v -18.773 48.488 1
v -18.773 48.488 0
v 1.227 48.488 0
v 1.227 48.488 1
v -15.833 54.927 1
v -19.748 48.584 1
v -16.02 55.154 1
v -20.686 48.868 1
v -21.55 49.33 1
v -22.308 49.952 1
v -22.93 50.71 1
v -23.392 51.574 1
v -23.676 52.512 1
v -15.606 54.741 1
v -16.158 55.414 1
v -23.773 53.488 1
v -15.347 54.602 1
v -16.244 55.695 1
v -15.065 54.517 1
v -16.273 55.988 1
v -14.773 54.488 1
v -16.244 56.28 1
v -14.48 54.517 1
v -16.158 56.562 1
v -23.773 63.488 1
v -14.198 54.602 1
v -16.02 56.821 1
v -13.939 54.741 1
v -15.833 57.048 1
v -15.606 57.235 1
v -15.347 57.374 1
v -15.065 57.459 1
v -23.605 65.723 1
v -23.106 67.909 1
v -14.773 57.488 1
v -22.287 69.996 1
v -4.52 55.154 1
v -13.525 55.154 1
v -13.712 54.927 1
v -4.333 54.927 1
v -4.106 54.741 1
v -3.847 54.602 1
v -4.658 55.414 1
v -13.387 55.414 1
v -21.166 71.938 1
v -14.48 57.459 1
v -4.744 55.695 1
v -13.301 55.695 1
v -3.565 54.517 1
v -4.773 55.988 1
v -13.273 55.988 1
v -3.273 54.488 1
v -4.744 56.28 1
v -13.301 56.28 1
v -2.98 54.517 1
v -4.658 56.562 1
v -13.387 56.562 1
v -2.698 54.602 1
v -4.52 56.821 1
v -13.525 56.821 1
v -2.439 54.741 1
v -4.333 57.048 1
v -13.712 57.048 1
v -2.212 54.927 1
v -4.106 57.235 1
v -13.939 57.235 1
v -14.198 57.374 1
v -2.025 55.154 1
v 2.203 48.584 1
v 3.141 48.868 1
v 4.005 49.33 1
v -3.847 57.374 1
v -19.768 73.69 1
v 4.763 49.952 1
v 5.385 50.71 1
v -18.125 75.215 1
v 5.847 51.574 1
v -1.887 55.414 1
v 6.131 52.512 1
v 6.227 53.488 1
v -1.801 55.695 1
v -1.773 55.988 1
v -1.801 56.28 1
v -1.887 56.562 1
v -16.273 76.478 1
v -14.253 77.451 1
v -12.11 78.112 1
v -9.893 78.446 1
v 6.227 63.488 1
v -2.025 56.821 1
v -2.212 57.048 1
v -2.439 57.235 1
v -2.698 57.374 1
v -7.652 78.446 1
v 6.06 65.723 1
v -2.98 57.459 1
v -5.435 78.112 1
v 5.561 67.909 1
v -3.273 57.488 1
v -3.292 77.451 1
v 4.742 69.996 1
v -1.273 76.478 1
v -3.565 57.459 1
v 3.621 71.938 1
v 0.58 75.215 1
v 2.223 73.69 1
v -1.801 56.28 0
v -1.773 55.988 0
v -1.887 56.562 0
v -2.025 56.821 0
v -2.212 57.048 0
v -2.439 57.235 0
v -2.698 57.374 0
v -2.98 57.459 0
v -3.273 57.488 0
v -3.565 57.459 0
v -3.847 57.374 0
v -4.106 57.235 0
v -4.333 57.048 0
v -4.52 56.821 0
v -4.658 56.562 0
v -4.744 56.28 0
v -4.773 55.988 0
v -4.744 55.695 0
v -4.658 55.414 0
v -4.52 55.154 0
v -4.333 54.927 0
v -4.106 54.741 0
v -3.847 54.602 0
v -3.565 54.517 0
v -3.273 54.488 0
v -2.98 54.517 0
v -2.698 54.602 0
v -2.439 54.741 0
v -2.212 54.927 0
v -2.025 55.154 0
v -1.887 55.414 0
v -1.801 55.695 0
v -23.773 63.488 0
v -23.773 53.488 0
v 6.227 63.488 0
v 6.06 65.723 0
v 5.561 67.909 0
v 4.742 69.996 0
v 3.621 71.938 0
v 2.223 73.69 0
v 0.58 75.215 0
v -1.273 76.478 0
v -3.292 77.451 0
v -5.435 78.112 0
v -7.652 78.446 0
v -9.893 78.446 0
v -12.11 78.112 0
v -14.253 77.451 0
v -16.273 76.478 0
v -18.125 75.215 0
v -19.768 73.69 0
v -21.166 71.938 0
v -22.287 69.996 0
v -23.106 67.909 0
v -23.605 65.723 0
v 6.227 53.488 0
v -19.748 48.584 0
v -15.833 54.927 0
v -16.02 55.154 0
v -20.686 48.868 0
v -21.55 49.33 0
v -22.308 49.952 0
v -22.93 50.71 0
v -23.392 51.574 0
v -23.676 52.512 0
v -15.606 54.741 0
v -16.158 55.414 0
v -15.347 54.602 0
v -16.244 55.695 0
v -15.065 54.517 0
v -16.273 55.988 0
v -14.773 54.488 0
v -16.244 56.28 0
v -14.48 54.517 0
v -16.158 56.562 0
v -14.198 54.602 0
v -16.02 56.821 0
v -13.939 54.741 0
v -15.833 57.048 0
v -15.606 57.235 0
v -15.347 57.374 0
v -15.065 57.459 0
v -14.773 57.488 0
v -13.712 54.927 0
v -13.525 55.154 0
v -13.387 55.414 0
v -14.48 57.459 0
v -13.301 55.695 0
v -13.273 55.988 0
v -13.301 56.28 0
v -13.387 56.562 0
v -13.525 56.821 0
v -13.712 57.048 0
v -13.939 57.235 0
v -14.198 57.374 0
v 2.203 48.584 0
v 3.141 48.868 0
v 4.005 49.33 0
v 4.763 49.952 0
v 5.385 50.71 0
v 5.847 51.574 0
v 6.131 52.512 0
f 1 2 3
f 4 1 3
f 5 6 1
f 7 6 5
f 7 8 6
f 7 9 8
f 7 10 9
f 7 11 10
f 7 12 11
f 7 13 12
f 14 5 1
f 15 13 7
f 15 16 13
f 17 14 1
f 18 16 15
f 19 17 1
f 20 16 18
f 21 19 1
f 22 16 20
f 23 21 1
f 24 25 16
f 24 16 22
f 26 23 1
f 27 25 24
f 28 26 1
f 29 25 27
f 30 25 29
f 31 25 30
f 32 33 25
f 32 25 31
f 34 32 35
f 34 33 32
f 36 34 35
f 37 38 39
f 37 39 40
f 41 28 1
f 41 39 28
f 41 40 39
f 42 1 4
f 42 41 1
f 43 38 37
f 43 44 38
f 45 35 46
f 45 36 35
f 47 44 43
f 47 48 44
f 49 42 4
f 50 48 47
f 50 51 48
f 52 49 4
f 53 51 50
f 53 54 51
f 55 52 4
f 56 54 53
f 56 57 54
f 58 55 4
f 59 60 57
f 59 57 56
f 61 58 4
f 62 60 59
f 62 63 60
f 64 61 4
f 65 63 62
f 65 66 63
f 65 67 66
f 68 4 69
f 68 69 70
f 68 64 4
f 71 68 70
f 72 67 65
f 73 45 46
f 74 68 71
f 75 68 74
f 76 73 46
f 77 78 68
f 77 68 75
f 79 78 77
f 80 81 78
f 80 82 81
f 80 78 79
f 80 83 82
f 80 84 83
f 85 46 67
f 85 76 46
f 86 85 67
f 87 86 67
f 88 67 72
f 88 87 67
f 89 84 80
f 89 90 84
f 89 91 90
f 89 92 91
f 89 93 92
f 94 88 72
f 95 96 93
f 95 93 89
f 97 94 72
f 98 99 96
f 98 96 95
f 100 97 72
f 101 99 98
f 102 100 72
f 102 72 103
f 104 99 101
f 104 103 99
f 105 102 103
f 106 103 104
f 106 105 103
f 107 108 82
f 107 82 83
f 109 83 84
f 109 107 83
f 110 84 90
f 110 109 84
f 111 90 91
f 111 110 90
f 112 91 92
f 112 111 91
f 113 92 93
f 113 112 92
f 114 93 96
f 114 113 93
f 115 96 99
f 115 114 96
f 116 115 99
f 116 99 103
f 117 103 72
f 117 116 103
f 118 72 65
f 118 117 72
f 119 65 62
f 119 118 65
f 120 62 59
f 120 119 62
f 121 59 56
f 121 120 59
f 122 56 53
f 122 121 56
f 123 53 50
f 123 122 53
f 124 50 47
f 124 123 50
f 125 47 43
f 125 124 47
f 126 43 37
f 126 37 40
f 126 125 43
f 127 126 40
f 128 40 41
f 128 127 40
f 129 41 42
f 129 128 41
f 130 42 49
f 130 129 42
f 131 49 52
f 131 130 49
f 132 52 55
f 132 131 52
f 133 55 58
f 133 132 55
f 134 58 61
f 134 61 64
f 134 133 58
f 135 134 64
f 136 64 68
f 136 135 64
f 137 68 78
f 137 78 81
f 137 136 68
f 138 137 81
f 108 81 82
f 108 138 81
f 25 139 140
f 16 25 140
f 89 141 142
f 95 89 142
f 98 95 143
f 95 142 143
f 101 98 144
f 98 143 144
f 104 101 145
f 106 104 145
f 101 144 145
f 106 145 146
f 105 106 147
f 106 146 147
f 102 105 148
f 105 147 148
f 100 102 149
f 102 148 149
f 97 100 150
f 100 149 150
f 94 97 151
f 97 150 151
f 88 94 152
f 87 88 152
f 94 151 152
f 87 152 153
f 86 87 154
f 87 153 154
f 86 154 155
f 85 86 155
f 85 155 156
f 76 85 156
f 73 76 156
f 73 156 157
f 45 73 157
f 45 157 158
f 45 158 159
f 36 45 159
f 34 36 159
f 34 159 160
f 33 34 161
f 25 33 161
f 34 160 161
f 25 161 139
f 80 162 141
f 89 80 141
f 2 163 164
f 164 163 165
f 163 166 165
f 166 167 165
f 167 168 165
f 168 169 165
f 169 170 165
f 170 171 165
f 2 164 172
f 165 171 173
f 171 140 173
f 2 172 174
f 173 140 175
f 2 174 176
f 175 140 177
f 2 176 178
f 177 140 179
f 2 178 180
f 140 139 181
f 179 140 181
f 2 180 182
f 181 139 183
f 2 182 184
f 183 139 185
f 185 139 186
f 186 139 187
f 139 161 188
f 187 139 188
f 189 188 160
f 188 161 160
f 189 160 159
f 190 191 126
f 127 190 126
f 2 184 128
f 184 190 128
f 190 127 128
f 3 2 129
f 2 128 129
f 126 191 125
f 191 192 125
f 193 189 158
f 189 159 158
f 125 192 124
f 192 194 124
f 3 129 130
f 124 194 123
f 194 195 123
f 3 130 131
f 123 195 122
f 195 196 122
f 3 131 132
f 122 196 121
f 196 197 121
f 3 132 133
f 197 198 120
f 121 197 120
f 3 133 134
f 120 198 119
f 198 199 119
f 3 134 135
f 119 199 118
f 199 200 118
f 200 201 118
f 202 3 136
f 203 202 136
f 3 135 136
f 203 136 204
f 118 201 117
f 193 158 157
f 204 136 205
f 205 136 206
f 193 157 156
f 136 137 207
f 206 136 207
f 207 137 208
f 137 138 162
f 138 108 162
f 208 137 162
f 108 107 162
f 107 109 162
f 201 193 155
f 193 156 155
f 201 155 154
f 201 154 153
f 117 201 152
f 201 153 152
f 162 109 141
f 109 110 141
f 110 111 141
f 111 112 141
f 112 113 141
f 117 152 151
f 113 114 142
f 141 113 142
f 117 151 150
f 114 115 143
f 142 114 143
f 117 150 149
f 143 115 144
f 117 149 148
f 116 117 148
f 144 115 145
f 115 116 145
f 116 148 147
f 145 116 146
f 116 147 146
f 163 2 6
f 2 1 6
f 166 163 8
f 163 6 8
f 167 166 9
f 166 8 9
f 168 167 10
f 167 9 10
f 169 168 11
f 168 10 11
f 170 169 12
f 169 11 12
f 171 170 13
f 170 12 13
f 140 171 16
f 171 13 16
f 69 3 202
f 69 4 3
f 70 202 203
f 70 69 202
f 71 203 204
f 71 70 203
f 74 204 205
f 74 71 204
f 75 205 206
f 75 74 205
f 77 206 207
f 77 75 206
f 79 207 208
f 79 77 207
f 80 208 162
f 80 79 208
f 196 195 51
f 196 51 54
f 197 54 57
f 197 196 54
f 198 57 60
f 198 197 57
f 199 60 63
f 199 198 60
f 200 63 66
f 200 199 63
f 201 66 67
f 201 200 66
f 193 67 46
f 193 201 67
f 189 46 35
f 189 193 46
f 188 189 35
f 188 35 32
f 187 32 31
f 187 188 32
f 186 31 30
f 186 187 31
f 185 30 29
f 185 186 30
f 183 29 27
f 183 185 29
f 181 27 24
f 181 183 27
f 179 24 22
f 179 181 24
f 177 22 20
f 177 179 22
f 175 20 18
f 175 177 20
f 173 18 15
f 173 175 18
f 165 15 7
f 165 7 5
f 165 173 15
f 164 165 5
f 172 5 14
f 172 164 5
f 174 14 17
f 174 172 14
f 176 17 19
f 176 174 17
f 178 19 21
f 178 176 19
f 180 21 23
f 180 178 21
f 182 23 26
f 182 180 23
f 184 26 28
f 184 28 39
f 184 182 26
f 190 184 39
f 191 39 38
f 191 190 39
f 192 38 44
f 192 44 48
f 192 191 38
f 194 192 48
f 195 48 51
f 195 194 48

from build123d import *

# Parameters (mm, degrees)
SKETCH1_R           = 1.5
BOSS_EXTRUDE1_DEPTH = 1
FILLET2_R           = 5
FILLET3_R           = 5


with BuildPart() as part:
    # Sketch1 → Boss-Extrude1 (new body)
    with BuildSketch(Plane.XY):
        with BuildLine():
            Line((-23.772522595, 48.487733688), (6.227477405, 48.487733688))
            Line((6.227477405, 48.487733688), (6.227477405, 63.487733688))
            ThreePointArc((6.227477405, 63.487733688), (-8.772522595, 78.487733688), (-23.772522595, 63.487733688))
            Line((-23.772522595, 63.487733688), (-23.772522595, 48.487733688))
        make_face()
        with Locations((-14.772522595, 55.987733688)):
            Circle(SKETCH1_R, mode=Mode.SUBTRACT)
        with Locations((-3.272522595, 55.987733688)):
            Circle(SKETCH1_R, mode=Mode.SUBTRACT)
    extrude(amount=BOSS_EXTRUDE1_DEPTH)

    # Fillet2
    fillet2_edges = [part.edges().sort_by_distance(p)[0] for p in [
        (-23.772522595, 48.487733688, 0.5),
    ]]
    fillet(fillet2_edges, radius=FILLET2_R)

    # Fillet3
    fillet3_edges = [part.edges().sort_by_distance(p)[0] for p in [
        (6.227477405, 48.487733688, 0.5),
    ]]
    fillet(fillet3_edges, radius=FILLET3_R)


solid = part.part
